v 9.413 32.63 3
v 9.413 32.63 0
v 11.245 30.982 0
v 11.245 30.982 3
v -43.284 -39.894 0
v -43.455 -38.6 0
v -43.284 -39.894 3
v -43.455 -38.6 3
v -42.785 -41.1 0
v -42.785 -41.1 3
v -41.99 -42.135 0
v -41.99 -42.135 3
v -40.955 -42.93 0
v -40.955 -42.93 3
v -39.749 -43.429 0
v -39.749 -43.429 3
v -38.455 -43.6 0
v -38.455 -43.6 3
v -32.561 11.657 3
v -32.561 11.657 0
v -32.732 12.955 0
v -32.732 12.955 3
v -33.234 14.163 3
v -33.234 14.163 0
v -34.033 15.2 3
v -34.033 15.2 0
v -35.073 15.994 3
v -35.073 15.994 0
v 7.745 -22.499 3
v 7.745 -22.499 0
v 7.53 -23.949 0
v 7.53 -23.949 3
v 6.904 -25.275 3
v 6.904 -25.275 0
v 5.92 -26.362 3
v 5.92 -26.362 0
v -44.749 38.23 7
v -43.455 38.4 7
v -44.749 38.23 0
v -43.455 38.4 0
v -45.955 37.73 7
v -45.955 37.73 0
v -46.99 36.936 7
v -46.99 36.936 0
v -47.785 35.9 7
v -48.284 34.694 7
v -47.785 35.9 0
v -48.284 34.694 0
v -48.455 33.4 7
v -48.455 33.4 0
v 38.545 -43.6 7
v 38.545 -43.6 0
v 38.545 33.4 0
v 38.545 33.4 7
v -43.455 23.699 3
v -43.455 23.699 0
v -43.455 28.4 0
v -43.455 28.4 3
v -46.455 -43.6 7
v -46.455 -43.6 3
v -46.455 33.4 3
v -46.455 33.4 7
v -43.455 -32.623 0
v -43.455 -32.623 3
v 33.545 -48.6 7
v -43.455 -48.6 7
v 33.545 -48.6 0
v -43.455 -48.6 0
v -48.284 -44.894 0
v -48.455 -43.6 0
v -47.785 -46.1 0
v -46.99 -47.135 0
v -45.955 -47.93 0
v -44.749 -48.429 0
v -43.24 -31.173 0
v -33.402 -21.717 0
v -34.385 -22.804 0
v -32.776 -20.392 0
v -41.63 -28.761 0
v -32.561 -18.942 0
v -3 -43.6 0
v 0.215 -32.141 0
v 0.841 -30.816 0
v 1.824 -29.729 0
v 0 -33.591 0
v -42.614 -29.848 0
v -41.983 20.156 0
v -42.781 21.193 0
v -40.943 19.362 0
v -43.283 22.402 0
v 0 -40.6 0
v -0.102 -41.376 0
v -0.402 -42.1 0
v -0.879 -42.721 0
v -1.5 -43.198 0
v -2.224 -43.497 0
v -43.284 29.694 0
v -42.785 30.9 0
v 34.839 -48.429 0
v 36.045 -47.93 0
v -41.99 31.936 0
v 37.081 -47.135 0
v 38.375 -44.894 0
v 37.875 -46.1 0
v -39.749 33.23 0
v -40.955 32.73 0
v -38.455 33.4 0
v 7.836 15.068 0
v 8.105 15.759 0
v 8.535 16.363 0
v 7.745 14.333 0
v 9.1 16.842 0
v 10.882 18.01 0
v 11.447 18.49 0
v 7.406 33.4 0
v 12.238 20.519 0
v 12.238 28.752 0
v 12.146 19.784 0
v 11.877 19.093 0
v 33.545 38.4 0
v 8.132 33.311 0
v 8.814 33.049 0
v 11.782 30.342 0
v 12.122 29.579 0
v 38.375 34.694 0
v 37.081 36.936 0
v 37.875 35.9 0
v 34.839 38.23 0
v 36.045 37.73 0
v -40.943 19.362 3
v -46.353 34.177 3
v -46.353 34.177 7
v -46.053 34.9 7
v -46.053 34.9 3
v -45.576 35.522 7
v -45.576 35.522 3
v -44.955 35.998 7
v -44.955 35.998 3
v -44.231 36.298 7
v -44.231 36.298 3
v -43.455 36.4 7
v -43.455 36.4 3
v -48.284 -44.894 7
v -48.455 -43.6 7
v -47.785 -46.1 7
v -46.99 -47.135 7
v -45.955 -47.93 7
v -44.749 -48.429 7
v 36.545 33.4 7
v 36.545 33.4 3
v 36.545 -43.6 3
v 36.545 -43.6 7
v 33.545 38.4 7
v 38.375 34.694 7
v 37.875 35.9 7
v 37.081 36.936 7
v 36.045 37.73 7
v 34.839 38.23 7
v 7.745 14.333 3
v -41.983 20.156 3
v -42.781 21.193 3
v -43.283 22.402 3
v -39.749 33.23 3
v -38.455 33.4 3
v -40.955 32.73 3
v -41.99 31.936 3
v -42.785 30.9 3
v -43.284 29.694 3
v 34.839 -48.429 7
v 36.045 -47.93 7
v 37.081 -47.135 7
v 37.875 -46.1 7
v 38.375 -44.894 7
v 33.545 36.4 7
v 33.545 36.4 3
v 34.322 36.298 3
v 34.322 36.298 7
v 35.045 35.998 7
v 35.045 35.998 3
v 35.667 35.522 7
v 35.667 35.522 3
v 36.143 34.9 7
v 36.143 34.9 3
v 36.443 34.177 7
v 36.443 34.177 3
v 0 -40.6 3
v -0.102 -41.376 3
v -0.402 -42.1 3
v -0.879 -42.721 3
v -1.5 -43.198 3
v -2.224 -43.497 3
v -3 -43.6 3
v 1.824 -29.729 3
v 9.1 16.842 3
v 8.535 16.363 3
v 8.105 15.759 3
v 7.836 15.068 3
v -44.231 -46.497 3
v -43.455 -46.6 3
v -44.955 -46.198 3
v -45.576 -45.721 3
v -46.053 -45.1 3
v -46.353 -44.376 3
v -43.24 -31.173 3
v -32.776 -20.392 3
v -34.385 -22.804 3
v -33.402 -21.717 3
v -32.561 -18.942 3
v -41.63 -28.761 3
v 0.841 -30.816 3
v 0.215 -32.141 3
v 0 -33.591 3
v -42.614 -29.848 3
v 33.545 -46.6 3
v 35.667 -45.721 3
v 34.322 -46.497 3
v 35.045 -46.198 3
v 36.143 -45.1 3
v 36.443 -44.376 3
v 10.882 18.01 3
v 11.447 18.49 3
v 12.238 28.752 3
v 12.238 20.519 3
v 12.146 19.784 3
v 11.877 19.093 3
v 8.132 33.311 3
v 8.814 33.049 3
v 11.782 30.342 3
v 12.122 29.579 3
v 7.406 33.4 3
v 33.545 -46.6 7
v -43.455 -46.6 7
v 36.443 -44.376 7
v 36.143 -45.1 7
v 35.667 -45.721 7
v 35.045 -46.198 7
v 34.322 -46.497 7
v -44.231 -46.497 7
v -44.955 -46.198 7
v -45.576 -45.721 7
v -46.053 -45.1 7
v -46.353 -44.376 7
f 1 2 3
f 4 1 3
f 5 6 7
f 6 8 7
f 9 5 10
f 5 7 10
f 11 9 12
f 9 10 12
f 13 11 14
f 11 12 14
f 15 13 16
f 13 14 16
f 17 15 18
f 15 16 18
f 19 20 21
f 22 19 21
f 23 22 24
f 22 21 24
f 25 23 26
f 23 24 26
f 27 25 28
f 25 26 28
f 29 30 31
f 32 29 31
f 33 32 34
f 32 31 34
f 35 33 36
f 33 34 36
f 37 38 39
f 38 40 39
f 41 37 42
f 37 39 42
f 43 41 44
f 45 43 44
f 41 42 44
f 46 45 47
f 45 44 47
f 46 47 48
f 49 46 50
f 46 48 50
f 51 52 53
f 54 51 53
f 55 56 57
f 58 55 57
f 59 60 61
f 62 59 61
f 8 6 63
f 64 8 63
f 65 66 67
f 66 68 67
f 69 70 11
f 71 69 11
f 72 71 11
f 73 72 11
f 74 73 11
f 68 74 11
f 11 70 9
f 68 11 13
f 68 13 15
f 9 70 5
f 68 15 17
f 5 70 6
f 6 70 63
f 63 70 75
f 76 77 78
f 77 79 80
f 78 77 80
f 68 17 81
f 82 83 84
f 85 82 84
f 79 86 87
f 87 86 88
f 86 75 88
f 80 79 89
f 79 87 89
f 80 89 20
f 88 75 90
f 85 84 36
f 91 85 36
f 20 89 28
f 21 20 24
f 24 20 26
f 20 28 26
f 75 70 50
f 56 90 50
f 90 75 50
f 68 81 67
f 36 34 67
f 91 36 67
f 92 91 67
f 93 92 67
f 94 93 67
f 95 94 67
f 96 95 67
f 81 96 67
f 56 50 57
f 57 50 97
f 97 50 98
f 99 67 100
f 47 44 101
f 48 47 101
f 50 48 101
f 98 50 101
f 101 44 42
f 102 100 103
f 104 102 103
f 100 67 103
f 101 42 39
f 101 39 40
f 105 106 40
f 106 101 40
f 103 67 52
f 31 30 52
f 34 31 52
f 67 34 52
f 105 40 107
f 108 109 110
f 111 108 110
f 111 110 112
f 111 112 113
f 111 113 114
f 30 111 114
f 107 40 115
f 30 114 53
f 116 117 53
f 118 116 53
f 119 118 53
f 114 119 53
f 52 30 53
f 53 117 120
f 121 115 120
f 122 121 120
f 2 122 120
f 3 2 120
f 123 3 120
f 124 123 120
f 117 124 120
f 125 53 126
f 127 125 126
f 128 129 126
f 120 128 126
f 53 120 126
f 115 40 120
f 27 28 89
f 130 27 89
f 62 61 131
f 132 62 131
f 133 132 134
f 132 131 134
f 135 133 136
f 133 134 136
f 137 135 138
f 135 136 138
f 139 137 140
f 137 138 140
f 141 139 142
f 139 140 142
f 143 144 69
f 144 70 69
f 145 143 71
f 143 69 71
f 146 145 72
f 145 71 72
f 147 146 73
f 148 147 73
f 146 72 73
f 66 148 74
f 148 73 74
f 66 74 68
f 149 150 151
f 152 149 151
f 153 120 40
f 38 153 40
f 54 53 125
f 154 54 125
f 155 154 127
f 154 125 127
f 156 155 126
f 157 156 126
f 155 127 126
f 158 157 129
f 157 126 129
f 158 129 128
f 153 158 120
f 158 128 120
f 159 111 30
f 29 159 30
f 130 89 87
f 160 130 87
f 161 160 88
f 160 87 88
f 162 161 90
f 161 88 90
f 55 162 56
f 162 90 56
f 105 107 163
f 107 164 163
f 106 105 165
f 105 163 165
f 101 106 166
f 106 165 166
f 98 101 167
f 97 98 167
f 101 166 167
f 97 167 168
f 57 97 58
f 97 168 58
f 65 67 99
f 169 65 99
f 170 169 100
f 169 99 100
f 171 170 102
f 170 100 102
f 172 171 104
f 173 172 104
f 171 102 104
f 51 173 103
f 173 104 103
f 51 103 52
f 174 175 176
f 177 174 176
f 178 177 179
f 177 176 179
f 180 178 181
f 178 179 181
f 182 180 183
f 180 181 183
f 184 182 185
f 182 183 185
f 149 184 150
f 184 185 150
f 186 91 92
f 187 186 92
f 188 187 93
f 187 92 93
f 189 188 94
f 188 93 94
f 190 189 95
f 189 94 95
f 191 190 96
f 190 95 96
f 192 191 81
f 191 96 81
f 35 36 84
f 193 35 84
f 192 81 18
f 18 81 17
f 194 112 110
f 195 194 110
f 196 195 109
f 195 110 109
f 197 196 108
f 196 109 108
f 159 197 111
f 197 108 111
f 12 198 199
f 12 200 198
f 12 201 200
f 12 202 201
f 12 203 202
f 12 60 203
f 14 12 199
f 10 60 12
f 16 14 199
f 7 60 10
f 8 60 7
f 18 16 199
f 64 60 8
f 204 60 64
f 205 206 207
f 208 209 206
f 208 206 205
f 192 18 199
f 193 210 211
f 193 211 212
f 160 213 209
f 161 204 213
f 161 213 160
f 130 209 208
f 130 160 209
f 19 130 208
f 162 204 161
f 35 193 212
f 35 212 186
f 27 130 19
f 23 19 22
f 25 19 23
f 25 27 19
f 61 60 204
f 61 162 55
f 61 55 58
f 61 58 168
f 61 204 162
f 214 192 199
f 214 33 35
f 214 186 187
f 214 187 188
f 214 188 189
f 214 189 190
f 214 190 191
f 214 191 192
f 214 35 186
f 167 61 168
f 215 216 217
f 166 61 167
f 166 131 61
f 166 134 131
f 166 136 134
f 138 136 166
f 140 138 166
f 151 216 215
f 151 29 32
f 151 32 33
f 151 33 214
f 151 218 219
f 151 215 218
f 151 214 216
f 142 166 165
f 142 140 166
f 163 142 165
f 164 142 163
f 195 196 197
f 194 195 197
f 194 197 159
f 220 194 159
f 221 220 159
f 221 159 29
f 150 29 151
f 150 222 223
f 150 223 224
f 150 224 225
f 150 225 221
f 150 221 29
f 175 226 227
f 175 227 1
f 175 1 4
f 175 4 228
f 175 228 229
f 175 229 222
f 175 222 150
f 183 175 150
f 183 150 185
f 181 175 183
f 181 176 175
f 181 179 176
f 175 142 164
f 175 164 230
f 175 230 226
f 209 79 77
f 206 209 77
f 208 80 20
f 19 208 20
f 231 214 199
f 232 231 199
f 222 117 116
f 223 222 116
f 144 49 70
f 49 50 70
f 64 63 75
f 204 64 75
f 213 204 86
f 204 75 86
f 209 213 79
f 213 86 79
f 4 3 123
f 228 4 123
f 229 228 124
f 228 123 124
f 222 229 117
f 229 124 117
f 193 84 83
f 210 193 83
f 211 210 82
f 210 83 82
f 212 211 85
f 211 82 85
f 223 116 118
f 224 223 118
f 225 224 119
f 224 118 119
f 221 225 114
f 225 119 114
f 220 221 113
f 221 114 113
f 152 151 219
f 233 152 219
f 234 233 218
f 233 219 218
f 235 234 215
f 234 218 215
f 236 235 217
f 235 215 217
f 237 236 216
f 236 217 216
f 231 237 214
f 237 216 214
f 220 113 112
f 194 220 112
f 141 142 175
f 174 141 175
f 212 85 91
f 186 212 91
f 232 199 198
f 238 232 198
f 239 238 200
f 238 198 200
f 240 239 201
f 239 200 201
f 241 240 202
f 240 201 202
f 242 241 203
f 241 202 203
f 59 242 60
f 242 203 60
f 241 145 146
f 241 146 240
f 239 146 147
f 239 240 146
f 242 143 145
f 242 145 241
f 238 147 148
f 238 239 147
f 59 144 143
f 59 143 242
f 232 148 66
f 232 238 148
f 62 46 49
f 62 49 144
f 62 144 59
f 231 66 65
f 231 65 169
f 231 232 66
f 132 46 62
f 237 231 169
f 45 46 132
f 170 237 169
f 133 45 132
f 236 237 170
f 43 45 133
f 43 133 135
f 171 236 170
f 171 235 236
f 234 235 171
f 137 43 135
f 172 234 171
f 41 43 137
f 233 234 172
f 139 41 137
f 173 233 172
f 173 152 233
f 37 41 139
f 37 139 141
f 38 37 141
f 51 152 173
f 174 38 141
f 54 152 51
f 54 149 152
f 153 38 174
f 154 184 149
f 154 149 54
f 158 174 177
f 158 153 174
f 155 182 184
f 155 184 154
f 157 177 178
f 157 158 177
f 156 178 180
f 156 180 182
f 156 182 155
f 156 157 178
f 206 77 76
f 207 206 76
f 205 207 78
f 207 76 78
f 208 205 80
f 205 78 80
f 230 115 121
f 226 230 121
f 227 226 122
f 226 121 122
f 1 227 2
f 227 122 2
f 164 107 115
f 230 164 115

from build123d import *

# Parameters (mm, degrees)
F1_DEPTH = 3
F2_R     = 5
F3_R     = 5
F5_DEPTH = 4


with BuildPart() as f1:
    # F0 (on Top) → F1 (new body)
    with BuildSketch(Plane.XY):
        with BuildLine():
            Line((33.545249, 38.400311), (-43.454751, 38.400311))
            ThreePointArc((-43.454751, 38.400311), (-46.990285, 36.935845), (-48.454751, 33.400311))
            Line((-48.454751, 33.400311), (-48.454751, -43.599689))
            ThreePointArc((-48.454751, -43.599689), (-46.990285, -47.135222), (-43.454751, -48.599689))
            Line((-43.454751, -48.599689), (33.545249, -48.599689))
            ThreePointArc((33.545249, -48.599689), (37.080783, -47.135222), (38.545249, -43.599689))
            Line((38.545249, -43.599689), (38.545249, 33.400311))
            ThreePointArc((38.545249, 33.400311), (37.080783, 36.935845), (33.545249, 38.400311))
        make_face()
        with BuildLine():
            Line((-43.454751, 23.699071), (-43.454751, 33.400311))
            Line((-43.454751, 33.400311), (-2.236148, 33.400311))
            Line((-2.236148, 33.400311), (0, 33.400311))
            Line((0, 33.400311), (7.406416, 33.400311))
            ThreePointArc((7.406416, 33.400311), (8.481207, 33.201173), (9.41331, 32.630194))
            Line((9.41331, 32.630194), (11.244695, 30.981947))
            ThreePointArc((11.244695, 30.981947), (11.978301, 29.972581), (12.237801, 28.752065))
            Line((12.237801, 28.752065), (12.237801, 20.519217))
            ThreePointArc((12.237801, 20.519217), (11.877237, 19.093252), (10.882217, 18.010054))
            Line((10.882217, 18.010054), (9.100236, 16.842208))
            ThreePointArc((9.100236, 16.842208), (8.105216, 15.759011), (7.744652, 14.333046))
            Line((7.744652, 14.333046), (7.744652, -22.499491))
            ThreePointArc((7.744652, -22.499491), (7.265583, -24.635184), (5.920179, -26.361618))
            Line((5.920179, -26.361618), (1.824473, -29.729199))
            ThreePointArc((1.824473, -29.729199), (0.479069, -31.455634), (0, -33.591326))
            Line((0, -33.591326), (0, -40.599689))
            ThreePointArc((0, -40.599689), (-0.87868, -42.721009), (-3, -43.599689))
            Line((-3, -43.599689), (-43.454751, -43.599689))
            Line((-43.454751, -43.599689), (-43.454751, -32.622973))
            ThreePointArc((-43.454751, -32.622973), (-42.975682, -30.487281), (-41.630278, -28.760846))
            Line((-41.630278, -28.760846), (-34.385276, -22.803844))
            ThreePointArc((-34.385276, -22.803844), (-33.039872, -21.077409), (-32.560803, -18.941716))
            Line((-32.560803, -18.941716), (-32.560803, 11.657347))
            ThreePointArc((-32.560803, 11.657347), (-33.234097, 14.163262), (-35.072648, 15.994291))
            Line((-35.072648, 15.994291), (-40.942907, 19.362127))
            ThreePointArc((-40.942907, 19.362127), (-42.781458, 21.193155), (-43.454751, 23.699071))
        make_face(mode=Mode.SUBTRACT)
    extrude(amount=F1_DEPTH)

    # F2
    f2_edges = [f1.edges().sort_by_distance(p)[0] for p in [
        (-43.454751, 33.400311, 1.5),
    ]]
    fillet(f2_edges, radius=F2_R)

    # F3
    f3_edges = [f1.edges().sort_by_distance(p)[0] for p in [
        (-43.454751, -43.599689, 1.5),
    ]]
    fillet(f3_edges, radius=F3_R)

    # F4 (on face) → F5 (join)
    with BuildSketch(Plane.XY.offset(3)):
        with BuildLine():
            Line((33.545249, 38.400311), (-43.454751, 38.400311))
            ThreePointArc((-43.454751, 38.400311), (-46.990285, 36.935845), (-48.454751, 33.400311))
            Line((-48.454751, 33.400311), (-48.454751, -43.599689))
            ThreePointArc((-48.454751, -43.599689), (-46.990285, -47.135222), (-43.454751, -48.599689))
            Line((-43.454751, -48.599689), (33.545249, -48.599689))
            ThreePointArc((33.545249, -48.599689), (37.080783, -47.135222), (38.545249, -43.599689))
            Line((38.545249, -43.599689), (38.545249, 33.400311))
            ThreePointArc((38.545249, 33.400311), (37.080783, 36.935845), (33.545249, 38.400311))
        make_face()
        with BuildLine():
            ThreePointArc((-46.454751, 33.400311), (-45.576071, 35.521631), (-43.454751, 36.400311))
            Line((-43.454751, 36.400311), (33.545249, 36.400311))
            ThreePointArc((33.545249, 36.400311), (35.666568, 35.521631), (36.545248, 33.400311))
            Line((36.545248, 33.400311), (36.545248, -43.599689))
            ThreePointArc((36.545248, -43.599689), (35.666568, -45.721008), (33.545249, -46.599688))
            Line((33.545249, -46.599688), (-43.454751, -46.599688))
            ThreePointArc((-43.454751, -46.599688), (-45.576071, -45.721008), (-46.454751, -43.599689))
            Line((-46.454751, -43.599689), (-46.454751, 33.400311))
        make_face(mode=Mode.SUBTRACT)
    extrude(amount=F5_DEPTH)


solid = f1.part
